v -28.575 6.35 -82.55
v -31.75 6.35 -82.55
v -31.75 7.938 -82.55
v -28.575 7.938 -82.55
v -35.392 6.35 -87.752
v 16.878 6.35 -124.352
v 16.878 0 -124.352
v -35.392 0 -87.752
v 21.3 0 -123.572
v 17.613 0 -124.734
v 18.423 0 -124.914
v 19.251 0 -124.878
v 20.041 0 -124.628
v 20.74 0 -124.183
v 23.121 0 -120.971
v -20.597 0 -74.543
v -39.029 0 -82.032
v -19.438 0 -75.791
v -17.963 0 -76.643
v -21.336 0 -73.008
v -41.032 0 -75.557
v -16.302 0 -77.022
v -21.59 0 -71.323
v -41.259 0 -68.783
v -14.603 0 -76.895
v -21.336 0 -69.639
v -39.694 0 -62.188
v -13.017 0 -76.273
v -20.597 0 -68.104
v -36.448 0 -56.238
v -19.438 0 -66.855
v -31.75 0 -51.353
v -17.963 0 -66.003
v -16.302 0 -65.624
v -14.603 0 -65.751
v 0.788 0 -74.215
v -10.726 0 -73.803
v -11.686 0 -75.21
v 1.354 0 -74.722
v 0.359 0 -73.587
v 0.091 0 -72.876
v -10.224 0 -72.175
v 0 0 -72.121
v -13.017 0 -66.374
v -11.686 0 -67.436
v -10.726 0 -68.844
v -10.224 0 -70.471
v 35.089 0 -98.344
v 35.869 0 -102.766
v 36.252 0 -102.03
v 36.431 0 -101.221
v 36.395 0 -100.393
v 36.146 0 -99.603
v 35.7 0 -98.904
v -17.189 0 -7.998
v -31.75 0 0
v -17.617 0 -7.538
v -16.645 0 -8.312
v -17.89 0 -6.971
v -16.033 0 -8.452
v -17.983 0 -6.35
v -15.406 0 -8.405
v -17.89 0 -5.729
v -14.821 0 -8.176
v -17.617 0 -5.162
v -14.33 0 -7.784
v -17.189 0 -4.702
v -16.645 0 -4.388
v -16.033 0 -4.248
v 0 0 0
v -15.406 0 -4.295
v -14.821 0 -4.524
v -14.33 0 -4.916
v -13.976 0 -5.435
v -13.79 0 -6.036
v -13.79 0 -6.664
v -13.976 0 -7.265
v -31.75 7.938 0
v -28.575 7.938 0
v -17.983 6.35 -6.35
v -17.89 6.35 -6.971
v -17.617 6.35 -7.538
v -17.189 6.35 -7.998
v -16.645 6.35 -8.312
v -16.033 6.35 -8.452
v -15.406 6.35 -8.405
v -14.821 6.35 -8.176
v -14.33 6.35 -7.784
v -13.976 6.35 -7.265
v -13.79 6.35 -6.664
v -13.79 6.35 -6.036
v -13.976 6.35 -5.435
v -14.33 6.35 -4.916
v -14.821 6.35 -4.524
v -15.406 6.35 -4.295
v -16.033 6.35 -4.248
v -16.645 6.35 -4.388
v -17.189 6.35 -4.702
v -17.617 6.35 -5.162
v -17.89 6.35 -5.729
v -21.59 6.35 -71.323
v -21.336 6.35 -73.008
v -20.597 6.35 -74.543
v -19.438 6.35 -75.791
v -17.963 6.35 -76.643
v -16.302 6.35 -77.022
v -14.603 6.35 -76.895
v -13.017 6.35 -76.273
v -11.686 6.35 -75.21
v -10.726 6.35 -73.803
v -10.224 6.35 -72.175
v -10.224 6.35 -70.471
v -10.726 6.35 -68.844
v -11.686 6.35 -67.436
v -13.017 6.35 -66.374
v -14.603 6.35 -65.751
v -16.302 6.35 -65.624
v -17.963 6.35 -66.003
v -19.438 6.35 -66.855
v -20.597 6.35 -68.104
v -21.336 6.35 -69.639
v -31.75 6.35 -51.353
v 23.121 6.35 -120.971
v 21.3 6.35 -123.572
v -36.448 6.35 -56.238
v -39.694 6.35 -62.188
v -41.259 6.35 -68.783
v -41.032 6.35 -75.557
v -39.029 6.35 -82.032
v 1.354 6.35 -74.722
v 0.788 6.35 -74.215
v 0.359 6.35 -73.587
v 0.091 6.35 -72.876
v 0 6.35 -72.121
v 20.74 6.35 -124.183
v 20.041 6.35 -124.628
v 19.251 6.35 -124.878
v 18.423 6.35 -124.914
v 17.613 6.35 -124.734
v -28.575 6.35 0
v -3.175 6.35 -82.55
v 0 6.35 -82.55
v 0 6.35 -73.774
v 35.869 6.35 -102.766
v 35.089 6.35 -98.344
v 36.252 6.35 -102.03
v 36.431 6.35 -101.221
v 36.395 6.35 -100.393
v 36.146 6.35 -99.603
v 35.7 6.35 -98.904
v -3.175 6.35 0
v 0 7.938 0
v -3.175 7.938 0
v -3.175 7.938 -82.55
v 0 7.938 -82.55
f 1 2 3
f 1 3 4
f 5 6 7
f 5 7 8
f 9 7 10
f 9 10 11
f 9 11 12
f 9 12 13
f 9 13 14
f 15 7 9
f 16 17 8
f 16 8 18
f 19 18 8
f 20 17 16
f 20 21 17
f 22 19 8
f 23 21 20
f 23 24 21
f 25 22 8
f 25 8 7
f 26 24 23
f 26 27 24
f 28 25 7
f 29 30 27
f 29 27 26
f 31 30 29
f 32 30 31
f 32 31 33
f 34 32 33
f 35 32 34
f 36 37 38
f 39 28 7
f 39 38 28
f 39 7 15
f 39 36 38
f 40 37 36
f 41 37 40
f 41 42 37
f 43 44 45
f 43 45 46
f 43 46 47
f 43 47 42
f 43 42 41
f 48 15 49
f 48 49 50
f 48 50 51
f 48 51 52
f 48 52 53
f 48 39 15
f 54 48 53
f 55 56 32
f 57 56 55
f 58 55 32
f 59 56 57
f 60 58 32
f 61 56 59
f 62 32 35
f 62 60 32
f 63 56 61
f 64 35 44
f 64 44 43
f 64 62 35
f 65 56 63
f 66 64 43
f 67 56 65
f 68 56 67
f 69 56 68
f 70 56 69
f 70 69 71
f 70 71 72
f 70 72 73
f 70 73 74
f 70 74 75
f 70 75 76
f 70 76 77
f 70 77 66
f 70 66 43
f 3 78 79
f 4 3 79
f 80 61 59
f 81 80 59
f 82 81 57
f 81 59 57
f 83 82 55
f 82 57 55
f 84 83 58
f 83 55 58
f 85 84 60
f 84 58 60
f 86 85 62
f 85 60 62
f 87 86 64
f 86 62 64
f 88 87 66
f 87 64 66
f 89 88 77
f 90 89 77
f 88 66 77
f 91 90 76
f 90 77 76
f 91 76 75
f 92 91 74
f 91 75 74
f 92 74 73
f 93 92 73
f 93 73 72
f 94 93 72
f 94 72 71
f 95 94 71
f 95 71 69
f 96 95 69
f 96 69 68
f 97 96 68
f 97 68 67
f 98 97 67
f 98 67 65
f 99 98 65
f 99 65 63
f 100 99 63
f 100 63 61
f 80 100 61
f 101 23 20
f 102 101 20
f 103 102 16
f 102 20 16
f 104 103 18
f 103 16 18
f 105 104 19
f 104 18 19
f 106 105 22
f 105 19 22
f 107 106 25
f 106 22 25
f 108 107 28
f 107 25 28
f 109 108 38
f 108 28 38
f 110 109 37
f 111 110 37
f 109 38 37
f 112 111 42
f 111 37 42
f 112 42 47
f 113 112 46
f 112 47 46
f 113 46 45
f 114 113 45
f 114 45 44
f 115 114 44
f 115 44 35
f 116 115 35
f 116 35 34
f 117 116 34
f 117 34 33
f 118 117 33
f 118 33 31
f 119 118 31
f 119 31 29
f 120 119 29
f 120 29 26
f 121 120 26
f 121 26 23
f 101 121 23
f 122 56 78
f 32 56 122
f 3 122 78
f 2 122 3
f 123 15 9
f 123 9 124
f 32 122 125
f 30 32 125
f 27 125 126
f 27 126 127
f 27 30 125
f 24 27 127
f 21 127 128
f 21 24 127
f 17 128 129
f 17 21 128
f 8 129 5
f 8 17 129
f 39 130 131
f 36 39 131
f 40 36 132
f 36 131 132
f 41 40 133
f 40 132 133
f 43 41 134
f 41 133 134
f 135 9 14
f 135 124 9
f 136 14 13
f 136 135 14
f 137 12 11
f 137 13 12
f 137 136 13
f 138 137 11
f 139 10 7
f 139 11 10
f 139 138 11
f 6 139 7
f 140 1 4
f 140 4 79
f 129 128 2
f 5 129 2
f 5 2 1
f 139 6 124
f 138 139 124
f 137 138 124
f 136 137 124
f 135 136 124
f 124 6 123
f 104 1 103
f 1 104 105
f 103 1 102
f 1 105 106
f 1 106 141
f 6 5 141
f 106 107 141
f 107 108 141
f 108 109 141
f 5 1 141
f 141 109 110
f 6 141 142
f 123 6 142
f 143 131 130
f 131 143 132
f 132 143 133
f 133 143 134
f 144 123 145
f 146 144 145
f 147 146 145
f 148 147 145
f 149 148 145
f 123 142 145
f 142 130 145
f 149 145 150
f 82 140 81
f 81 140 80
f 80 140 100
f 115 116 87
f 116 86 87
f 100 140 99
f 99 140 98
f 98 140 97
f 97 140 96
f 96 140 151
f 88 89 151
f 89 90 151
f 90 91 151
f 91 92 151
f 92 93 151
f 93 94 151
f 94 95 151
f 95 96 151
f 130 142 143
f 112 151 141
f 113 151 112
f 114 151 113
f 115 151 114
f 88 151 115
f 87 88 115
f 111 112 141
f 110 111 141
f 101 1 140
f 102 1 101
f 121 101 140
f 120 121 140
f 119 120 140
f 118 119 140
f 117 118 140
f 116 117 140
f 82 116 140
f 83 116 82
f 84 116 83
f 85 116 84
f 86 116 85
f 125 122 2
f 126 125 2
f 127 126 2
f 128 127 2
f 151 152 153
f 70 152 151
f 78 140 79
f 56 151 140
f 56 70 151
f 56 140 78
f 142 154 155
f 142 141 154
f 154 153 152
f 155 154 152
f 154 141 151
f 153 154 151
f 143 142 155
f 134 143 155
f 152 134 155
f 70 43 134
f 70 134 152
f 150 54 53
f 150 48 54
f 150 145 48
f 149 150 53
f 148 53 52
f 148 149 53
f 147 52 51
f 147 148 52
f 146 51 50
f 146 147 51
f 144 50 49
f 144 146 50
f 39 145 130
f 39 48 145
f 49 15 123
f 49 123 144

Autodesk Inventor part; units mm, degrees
ref_plane "YZ Plane" through (0, 0, 0) normal (1, 0, 0) x (0, 1, 0)
ref_plane "XZ Plane" through (0, 0, 0) normal (0, 1, 0) x (-1, 0, 0)
ref_plane "XY Plane" through (0, 0, 0) normal (0, 0, 1) x (1, 0, 0)
sketch "Sketch1" plane through (0, 0, 0) normal (0, 1, 0) x (-1, 0, 0)
  line L0 (0, 0) -> (31.75, 0)
  line L1 (31.75, 0) -> (31.75, -82.55)
  line L2 (31.75, -82.55) -> (0, -82.55)
  line L3 (0, -82.55) -> (0, 0)
  line L4 (31.75, -82.55) -> (28.575, -82.55)
  line L5 (0, -82.55) -> (3.175, -82.55)
  line L6 (3.175, -82.55) -> (0, -82.55)
  line L7 (0, -82.55) -> (0, 0)
  line L8 (0, 0) -> (3.175, 0)
  line L9 (3.175, 0) -> (3.175, -82.55)
  line L10 (28.575, -82.55) -> (31.75, -82.55)
  line L11 (31.75, -82.55) -> (31.75, 0)
  line L12 (31.75, 0) -> (28.575, 0)
  line L13 (28.575, 0) -> (28.575, -82.55)
  line L14 (15.875, 0) -> (15.875, -6.35)
  circle A0 centre (15.875, -6.35) radius 2.1082
  line L15 (15.875, -6.35) -> (15.875, -71.3232)
  circle A1 centre (15.875, -71.3232) radius 5.715
  dimension "d0" = 31.75
  dimension "d1" = 3.175
  dimension "d2" = 3.175
  dimension "d3" = 82.55
  dimension "d4" = 6.35
  dimension "d5" = 4.2164
  dimension "d6" = 64.9732
  dimension "d13" = 11.43
extrude "Extrusion1" add sketch "Sketch1" along normal blind 6.35
sketch "Sketch2" plane through (0, 6.35, 0) normal (0, 1, 0) x (1, 0, 0)
  line L0 (-31.75, 0) -> (0, 0) projected
  line L1 (-31.75, 0) -> (-28.575, 0)
  line L2 (0, 0) -> (-3.175, 0)
  line L3 (0, 82.55) -> (-31.75, 82.55) projected
  line L4 (-28.575, 0) -> (-31.75, 0)
  line L5 (-31.75, 0) -> (-31.75, 82.55)
  line L6 (-31.75, 82.55) -> (-28.575, 82.55)
  line L7 (-28.575, 82.55) -> (-28.575, 0)
  line L8 (-3.175, 0) -> (0, 0)
  line L9 (0, 0) -> (0, 82.55)
  line L10 (0, 82.55) -> (-3.175, 82.55)
  line L11 (-3.175, 82.55) -> (-3.175, 0)
  dimension "d9" = 3.175
  dimension "d10" = 3.175
extrude "Extrusion2" add sketch "Sketch2" along normal blind 1.5875 contours L5 L3 L7 L0 | L11 L3 L9 L0
sketch "Sketch3" plane through (0, 0, 0) normal (0, -1, 0) x (1, 0, 0)
  line L0 (-31.75, -82.55) -> (-31.75, 0) projected
  line L1 (-31.75, -82.55) -> (-16.4111, -93.2904)
  line L2 (0, -82.55) -> (-31.75, -82.55) projected
  line L3 (-16.4111, -93.2904) -> (23.1212, -120.9712)
  line L4 (23.1212, -120.9712) -> (37.6901, -100.1648)
  line L5 (37.6901, -100.1648) -> (0, -73.7739)
  line L6 (0, 0) -> (0, -82.55) projected
  line L7 (-31.75, -82.55) -> (0, -82.55)
  dimension "d14" = 35
  dimension "d15" = 48.26
  dimension "d16" = 25.4
extrude "Extrusion3" add sketch "Sketch3" against normal blind 6.35
sketch "Sketch4" plane through (-31.75, 0, -82.55) normal (-0.5735764, 0, -0.819152) x (-0.819152, 0, 0.5735764)
  line L0 (-20.9743, 6.35) -> (-66.9854, 6.35) projected
  line L1 (0, 0) -> (0, 6.35) projected
  line L2 (-66.9854, 6.35) -> (0, 6.35)
  line L3 (0, 6.35) -> (0, 0)
  line L4 (0, 0) -> (-66.9854, 0)
  line L5 (-66.9854, 0) -> (-66.9854, 6.35)
  point P0 (21.3407, 0)
  point P1 (-20.9743, 6.35)
extrude "Extrusion4" add sketch "Sketch4" along normal blind 6.35
sketch "Sketch5" plane through (0, 0, 0) normal (0, -1, 0) x (1, 0, 0)
  circle A0 centre (-15.875, -71.3232) radius 5.715 projected
  arc A1 (-31.75, -51.3533) -> (-35.3922, -87.7516) centre (-15.875, -71.3232) ccw
  line L0 (-31.75, -82.55) -> (-31.75, 0) projected
  line L1 (-31.75, -82.55) -> (-35.3922, -87.7516) projected
  line L2 (-31.75, -51.3533) -> (-31.75, -82.55)
  line L3 (-31.75, -82.55) -> (-35.3922, -87.7516)
  point P0 (0, 0)
extrude "Extrusion5" add sketch "Sketch5" against normal blind 6.35 contours L0 L1 A1
fillet "Fillet2" radius 3.175 3 edges at (0, 3.175, -73.7739) (19.479, 3.175, -126.1729) (37.6901, 3.175, -100.1648)
properties part number "intake sleds"
